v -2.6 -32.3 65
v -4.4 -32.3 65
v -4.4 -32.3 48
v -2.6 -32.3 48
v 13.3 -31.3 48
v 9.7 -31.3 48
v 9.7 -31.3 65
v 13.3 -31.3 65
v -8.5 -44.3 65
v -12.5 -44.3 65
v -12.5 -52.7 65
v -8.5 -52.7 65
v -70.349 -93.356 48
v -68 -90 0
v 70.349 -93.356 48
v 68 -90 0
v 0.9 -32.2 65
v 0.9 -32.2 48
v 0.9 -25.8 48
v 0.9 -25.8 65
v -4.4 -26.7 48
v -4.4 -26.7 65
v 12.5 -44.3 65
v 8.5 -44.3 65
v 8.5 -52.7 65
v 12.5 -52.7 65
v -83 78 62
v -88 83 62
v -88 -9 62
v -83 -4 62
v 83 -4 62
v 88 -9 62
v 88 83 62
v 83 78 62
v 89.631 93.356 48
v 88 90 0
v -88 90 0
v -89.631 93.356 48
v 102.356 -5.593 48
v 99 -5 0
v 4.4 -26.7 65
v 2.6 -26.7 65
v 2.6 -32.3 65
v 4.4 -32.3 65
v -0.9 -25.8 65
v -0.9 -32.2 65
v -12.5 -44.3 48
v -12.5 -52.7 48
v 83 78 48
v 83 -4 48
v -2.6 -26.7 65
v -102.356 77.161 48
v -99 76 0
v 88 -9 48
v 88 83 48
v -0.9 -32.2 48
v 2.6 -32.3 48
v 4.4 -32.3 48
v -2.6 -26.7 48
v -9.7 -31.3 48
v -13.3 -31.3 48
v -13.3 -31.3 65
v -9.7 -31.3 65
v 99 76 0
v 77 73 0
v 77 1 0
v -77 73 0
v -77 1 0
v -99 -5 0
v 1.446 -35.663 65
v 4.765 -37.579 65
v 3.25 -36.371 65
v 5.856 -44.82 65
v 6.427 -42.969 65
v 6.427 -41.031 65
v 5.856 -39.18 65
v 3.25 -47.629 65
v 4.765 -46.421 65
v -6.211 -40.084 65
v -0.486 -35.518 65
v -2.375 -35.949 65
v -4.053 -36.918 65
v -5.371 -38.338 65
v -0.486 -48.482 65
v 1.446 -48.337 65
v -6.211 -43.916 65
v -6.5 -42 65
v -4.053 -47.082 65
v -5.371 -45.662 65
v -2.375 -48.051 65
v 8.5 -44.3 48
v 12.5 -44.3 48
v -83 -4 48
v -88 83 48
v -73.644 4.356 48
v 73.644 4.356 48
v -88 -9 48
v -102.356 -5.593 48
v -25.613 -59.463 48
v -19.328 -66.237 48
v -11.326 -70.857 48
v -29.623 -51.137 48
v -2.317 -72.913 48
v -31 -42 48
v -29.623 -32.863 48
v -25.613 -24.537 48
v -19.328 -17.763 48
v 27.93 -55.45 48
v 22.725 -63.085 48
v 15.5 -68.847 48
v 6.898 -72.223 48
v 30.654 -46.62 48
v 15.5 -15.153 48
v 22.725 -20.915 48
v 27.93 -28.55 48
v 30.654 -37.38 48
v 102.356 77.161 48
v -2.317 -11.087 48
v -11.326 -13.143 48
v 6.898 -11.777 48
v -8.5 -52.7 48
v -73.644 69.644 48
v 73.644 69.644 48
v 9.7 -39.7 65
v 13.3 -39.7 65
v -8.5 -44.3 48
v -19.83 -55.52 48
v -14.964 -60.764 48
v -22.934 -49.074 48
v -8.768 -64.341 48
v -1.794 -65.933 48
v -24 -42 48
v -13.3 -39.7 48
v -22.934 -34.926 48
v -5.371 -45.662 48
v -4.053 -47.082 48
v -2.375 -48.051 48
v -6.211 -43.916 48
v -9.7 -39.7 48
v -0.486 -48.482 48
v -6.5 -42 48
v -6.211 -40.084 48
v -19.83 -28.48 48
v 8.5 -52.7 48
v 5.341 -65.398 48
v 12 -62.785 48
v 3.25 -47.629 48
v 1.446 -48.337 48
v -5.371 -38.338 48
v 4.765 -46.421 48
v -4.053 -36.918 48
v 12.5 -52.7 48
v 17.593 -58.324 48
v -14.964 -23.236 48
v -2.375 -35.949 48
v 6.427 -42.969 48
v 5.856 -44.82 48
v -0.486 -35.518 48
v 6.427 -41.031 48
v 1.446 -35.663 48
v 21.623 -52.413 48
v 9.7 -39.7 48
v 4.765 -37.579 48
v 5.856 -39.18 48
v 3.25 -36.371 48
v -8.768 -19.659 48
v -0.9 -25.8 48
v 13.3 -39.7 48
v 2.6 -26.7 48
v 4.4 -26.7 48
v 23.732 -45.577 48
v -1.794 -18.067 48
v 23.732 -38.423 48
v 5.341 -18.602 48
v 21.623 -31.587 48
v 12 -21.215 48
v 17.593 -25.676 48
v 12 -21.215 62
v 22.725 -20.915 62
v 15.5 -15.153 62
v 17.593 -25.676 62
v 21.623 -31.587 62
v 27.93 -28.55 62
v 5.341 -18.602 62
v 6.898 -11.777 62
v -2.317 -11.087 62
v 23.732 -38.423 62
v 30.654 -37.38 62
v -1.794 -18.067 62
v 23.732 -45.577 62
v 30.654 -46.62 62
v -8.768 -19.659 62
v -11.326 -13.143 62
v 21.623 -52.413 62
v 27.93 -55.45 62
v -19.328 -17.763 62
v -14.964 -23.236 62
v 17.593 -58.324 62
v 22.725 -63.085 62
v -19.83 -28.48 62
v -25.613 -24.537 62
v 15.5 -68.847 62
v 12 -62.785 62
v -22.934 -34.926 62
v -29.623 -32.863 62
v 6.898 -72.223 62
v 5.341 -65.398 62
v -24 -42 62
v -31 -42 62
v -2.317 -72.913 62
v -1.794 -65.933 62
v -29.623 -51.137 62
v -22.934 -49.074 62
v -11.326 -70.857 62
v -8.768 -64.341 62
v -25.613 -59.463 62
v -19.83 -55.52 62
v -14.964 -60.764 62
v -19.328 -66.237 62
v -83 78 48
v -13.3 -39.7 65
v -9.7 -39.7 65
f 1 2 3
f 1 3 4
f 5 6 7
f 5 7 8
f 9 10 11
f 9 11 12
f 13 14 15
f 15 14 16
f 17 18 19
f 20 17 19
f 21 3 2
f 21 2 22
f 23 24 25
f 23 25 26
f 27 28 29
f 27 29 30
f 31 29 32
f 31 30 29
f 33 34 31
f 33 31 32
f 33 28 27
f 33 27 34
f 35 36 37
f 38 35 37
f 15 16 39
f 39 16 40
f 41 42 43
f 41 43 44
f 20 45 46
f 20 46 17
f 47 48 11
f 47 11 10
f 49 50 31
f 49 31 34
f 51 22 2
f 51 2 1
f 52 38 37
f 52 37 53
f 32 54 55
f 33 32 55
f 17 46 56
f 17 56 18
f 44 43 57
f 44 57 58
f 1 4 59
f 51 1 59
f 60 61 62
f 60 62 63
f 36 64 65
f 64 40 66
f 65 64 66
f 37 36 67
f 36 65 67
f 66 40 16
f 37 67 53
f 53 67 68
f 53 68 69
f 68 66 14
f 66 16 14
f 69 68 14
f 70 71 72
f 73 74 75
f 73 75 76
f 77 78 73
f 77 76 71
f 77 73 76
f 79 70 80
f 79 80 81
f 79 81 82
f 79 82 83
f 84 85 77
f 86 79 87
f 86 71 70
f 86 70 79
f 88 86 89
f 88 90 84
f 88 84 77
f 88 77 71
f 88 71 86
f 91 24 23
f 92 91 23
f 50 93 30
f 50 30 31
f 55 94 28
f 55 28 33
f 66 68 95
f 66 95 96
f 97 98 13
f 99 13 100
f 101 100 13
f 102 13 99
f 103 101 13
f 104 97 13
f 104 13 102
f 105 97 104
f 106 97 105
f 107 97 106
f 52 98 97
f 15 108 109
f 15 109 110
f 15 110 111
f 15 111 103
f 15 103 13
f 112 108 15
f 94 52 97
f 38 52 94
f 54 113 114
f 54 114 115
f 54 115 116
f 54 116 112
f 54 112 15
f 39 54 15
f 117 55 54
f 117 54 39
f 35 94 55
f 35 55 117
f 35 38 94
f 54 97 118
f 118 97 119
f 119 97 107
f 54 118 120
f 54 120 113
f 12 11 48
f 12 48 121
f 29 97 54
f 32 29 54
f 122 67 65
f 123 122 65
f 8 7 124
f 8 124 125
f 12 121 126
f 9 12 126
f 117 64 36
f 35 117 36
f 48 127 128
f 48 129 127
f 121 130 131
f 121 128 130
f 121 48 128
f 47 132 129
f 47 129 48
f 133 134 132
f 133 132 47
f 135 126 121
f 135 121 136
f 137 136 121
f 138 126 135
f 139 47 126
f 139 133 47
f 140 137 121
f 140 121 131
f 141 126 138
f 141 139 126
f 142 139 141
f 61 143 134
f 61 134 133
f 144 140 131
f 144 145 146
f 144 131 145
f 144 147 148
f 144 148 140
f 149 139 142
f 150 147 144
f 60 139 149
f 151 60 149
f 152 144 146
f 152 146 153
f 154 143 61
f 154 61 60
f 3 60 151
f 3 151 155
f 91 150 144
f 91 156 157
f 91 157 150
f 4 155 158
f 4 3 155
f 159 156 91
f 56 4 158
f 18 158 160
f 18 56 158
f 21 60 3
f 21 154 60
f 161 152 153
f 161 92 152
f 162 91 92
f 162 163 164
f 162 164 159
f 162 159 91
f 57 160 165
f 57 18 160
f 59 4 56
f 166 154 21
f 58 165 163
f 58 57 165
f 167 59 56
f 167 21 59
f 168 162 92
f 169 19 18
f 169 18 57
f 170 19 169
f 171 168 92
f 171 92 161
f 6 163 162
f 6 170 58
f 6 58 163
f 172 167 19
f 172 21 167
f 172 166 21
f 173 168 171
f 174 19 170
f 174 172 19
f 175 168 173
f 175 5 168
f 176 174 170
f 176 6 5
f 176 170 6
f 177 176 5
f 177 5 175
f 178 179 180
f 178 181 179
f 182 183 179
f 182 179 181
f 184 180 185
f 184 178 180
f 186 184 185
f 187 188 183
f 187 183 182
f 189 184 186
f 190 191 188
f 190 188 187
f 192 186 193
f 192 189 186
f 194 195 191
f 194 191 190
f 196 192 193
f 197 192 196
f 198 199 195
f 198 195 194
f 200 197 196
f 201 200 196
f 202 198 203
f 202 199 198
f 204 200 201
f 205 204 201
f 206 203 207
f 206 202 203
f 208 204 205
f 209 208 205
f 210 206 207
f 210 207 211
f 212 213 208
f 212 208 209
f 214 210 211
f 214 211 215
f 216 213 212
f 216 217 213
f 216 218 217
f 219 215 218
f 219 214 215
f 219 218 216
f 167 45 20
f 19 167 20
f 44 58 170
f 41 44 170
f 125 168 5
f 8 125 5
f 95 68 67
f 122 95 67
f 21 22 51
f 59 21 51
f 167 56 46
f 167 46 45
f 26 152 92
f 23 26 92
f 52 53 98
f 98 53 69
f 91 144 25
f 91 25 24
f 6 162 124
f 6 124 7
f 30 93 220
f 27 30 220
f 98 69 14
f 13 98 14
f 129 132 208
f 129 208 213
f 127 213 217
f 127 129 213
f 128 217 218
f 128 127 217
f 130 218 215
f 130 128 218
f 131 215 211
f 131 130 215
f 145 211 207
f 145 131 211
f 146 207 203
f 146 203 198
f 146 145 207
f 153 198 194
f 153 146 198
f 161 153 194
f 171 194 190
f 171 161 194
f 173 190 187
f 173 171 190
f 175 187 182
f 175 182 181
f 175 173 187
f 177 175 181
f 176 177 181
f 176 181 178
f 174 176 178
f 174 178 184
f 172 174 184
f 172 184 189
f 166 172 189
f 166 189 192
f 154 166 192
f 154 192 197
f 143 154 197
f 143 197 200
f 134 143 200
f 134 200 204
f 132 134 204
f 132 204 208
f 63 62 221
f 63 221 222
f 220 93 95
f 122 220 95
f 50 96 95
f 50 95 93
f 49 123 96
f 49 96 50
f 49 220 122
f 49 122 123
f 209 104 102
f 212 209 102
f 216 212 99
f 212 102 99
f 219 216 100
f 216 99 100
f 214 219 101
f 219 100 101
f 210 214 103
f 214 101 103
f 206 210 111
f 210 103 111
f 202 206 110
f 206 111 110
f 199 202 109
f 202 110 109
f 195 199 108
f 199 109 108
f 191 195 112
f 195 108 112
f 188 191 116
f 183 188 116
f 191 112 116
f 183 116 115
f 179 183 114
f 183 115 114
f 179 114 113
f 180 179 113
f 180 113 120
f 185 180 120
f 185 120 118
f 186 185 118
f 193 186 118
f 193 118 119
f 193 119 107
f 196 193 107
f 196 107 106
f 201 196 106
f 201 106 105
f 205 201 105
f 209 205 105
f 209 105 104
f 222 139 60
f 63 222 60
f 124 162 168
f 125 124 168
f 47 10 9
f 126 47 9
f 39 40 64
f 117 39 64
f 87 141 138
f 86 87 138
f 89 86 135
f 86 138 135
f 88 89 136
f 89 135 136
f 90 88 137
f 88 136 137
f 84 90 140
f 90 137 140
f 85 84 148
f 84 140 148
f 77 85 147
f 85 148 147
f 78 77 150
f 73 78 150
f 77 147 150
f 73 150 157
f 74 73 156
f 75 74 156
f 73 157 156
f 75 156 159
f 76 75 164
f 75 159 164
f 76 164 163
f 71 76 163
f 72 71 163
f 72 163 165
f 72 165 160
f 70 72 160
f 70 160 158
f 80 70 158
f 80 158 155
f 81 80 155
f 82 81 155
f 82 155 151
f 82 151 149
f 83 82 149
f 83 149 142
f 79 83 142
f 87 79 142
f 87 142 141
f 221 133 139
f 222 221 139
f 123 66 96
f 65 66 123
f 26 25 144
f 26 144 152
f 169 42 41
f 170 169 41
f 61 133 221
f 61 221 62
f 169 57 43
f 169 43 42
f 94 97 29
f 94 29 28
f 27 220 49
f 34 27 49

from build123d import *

# Parameters (mm, degrees)
SKETCH1_W           = 154
SKETCH1_H           = 72
BOSS_EXTRUDE1_DEPTH = 48
BOSS_EXTRUDE1_DRAFT = -4
SKETCH2_R           = 31
SKETCH2_R_2         = 24
SKETCH2_W           = 176
SKETCH2_H           = 92
SKETCH2_W_2         = 166
SKETCH2_H_2         = 82
BOSS_EXTRUDE2_DEPTH = 62
SKETCH3_R           = 6.5
SKETCH3_W           = 1.8
SKETCH3_H           = 5.6
SKETCH3_H_2         = 6.4
SKETCH3_W_2         = 3.6
SKETCH3_H_3         = 8.4
SKETCH3_W_3         = 4
BOSS_EXTRUDE3_DEPTH = 65


with BuildPart() as part:
    # Sketch1 → Boss-Extrude1 (with draft: the straight prism first)
    with BuildSketch(Plane.XY):
        Polygon((-88, 90), (-99, 76), (-99, -5), (-68, -90), (68, -90), (99, -5), (99, 76), (88, 90), align=None)
        with Locations((0, 37)):
            Rectangle(SKETCH1_W, SKETCH1_H, mode=Mode.SUBTRACT)
    extrude(amount=BOSS_EXTRUDE1_DEPTH)
    # Boss-Extrude1: the draft: its side faces are tilted about the plane it starts from
    boss_extrude1_sides = [part.faces().sort_by_distance(p)[0] for p in [
        (-93.5, 83, 24),
        (-99, 35.5, 24),
        (-83.5, -47.5, 24),
        (0, -90, 24),
        (83.5, -47.5, 24),
        (99, 35.5, 24),
        (93.5, 83, 24),
        (0, 90, 24),
        (-77, 37, 24),
        (0, 73, 24),
        (77, 37, 24),
        (0, 1, 24),
    ]]
    draft(boss_extrude1_sides, Plane.XY, BOSS_EXTRUDE1_DRAFT)

    # Sketch2 → Boss-Extrude2 (add)
    # profile 1 of 2: a face of its own
    with BuildSketch(Plane.XY):
        with Locations(Location((0, -42, 0), (0, 0, 180))):
            Circle(SKETCH2_R)
        with Locations(Location((0, -42, 0), (0, 0, 180))):
            Circle(SKETCH2_R_2, mode=Mode.SUBTRACT)
    # profile 2 of 2: a face of its own
    with BuildSketch(Plane.XY):
        with Locations((0, 37)):
            Rectangle(SKETCH2_W, SKETCH2_H)
        with Locations((0, 37)):
            Rectangle(SKETCH2_W_2, SKETCH2_H_2, mode=Mode.SUBTRACT)
    extrude(amount=BOSS_EXTRUDE2_DEPTH)

    # Sketch3 → Boss-Extrude3 (add)
    with BuildSketch(Plane.XY):
        with Locations(Location((0, -42, 0), (0, 0, 180))):
            Circle(SKETCH3_R)
        with Locations((-3.5, -29.5)):
            Rectangle(SKETCH3_W, SKETCH3_H)
        with Locations((0, -29)):
            Rectangle(SKETCH3_W, SKETCH3_H_2)
        with Locations((3.5, -29.5)):
            Rectangle(SKETCH3_W, SKETCH3_H)
        with Locations((-11.5, -35.5)):
            Rectangle(SKETCH3_W_2, SKETCH3_H_3)
        with Locations((11.5, -35.5)):
            Rectangle(SKETCH3_W_2, SKETCH3_H_3)
        with Locations((-10.5, -48.5)):
            Rectangle(SKETCH3_W_3, SKETCH3_H_3)
        with Locations((10.5, -48.5)):
            Rectangle(SKETCH3_W_3, SKETCH3_H_3)
    extrude(amount=BOSS_EXTRUDE3_DEPTH)


solid = part.part
